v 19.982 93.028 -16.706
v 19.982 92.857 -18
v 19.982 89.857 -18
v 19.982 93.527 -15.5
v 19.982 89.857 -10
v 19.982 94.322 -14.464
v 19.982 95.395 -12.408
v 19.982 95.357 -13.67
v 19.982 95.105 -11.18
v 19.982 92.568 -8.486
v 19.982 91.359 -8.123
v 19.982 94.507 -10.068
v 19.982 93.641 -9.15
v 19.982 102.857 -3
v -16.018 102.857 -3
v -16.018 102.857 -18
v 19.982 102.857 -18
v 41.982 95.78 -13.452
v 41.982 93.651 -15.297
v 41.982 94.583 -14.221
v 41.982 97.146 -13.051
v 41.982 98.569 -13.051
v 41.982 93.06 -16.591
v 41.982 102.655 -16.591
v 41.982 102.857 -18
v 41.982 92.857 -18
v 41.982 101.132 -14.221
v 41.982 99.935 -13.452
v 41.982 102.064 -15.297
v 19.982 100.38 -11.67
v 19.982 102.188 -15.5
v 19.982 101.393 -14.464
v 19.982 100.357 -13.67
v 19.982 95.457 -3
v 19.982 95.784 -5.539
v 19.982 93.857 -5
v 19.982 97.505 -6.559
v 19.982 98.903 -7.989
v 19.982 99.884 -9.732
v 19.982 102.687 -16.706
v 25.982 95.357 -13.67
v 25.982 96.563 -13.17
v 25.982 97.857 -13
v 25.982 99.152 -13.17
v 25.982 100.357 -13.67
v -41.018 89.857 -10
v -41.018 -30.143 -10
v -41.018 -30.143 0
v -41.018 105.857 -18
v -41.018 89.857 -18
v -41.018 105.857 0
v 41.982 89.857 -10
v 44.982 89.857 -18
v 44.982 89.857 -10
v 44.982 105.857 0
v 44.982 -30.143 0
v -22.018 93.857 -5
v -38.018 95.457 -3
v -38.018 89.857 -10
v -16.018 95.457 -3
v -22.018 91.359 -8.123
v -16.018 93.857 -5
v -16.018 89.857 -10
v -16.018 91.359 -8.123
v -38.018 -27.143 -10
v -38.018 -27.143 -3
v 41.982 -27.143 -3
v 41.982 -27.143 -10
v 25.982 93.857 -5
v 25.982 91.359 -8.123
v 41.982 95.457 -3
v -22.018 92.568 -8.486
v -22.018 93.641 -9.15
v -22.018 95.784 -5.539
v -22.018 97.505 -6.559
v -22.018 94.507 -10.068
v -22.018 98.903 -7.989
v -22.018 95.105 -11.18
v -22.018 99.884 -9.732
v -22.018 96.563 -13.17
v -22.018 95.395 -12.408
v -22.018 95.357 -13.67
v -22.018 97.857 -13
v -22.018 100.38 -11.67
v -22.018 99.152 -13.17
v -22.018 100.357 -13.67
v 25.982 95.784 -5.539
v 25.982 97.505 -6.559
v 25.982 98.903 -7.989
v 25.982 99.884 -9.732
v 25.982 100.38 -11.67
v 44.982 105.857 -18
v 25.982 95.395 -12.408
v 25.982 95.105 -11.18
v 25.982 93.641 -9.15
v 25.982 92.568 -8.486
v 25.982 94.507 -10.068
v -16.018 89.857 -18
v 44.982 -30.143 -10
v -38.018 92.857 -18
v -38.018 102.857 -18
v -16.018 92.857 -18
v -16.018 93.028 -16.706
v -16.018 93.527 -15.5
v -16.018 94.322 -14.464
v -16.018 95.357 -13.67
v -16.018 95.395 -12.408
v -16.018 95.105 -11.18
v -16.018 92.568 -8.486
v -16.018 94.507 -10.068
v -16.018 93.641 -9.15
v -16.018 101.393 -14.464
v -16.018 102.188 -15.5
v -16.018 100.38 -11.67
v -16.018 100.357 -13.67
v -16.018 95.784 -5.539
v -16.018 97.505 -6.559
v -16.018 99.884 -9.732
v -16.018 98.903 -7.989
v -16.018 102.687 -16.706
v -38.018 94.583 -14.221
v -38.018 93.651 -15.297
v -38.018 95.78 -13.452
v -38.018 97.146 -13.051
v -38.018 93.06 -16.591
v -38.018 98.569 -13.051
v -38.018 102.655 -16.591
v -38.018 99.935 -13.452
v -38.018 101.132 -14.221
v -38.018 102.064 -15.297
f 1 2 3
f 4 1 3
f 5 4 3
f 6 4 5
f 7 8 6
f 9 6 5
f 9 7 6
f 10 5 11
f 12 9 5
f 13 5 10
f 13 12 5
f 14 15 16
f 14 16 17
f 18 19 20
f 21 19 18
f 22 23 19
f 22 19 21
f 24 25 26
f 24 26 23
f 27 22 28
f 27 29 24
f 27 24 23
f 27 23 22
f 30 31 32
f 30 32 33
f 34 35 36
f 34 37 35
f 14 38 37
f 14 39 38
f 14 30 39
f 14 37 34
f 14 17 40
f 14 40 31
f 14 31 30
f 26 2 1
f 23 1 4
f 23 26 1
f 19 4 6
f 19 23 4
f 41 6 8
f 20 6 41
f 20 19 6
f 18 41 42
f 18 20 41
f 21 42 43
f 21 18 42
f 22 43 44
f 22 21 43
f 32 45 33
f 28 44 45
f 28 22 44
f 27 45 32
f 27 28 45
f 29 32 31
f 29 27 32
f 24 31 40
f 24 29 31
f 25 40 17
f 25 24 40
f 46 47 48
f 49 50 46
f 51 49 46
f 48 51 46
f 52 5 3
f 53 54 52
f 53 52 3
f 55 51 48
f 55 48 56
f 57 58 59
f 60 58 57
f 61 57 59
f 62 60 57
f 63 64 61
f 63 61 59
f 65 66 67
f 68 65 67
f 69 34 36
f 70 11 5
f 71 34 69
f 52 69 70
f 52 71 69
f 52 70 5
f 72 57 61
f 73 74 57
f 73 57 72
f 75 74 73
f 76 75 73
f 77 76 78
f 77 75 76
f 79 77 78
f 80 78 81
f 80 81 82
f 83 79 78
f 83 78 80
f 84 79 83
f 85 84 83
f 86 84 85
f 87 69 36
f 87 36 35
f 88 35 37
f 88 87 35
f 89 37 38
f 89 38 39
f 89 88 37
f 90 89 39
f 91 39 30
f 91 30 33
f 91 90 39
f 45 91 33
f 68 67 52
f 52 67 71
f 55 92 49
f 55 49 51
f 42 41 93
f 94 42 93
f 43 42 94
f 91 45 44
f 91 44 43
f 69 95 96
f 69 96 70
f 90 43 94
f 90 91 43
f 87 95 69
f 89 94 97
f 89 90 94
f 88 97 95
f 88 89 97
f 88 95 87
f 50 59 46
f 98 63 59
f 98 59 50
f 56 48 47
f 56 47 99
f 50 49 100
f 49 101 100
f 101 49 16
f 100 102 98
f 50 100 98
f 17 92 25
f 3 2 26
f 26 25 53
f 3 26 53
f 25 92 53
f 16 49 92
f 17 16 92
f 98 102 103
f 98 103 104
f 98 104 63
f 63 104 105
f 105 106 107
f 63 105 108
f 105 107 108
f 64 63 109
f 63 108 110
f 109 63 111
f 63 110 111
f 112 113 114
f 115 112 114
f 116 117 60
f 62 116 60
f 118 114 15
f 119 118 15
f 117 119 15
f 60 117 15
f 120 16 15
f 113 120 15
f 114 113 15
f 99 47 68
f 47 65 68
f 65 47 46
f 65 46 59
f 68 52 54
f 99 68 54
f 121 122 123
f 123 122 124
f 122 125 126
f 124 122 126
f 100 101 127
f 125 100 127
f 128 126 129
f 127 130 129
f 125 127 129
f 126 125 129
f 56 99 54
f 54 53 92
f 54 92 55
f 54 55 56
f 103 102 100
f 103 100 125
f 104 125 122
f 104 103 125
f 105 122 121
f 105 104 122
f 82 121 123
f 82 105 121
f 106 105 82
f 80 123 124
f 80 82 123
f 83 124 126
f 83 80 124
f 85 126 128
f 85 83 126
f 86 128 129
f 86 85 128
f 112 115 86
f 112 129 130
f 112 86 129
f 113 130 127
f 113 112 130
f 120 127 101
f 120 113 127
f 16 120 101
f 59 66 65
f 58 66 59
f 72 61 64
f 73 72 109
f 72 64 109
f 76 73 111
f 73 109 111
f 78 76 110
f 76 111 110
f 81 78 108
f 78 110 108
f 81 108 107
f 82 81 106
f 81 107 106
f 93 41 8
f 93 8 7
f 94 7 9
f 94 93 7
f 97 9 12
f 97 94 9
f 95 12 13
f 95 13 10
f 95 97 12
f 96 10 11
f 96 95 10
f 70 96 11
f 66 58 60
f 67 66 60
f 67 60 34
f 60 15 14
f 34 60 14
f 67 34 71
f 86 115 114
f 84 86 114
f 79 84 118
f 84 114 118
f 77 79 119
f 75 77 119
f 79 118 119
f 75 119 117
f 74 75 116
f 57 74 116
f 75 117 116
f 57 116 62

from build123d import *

# Parameters (mm, degrees)
SASE_TABAN1_W               = 80
SASE_TABAN1_H               = 130
Y_KSEKLIK_EKSTR_ZYON4_DEPTH = 3
SASE_TABAN1_5_W             = 86
SASE_TABAN1_5_H             = 136
SASE_TABAN1_5_W_2           = 80
SASE_TABAN1_5_H_2           = 130
Y_KSEKLIK_EKSTR_ZYON5_DEPTH = 10
Y_KSEKLIK_EKSTR_ZYON6_REACH = 138.755
KES_EKSTR_ZYON1_START       = -13
EKLEM_ORTA_W                = 36
EKLEM_ORTA_H                = 15
KES_EKSTR_ZYON1_DEPTH       = 13
KES_EKSTR_ZYON3_DEPTH       = 42
KES_EKSTR_ZYON4_START       = -6
KES_EKSTR_ZYON4_DEPTH       = 6
Y_KSEKLIK_EKSTR_ZYON7_START = -3
Y_KSEKLIK_EKSTR_ZYON7_DEPTH = 3
Y_KSEKLIK_EKSTR_ZYON8_DEPTH = 3


with BuildPart() as part:
    # sase_taban1 → Yükseklik-Ekstrüzyon4 (new body)
    with BuildSketch(Plane.XY):
        with Locations((1.981566113, 37.857486255)):
            Rectangle(SASE_TABAN1_W, SASE_TABAN1_H)
    extrude(amount=-Y_KSEKLIK_EKSTR_ZYON4_DEPTH)

    # sase_taban1<5> → Yükseklik-Ekstrüzyon5 (add)
    with BuildSketch(Plane.XY):
        with Locations((1.981566113, 37.857486255)):
            Rectangle(SASE_TABAN1_5_W, SASE_TABAN1_5_H)
        with Locations((1.981566113, 37.857486255)):
            Rectangle(SASE_TABAN1_5_W_2, SASE_TABAN1_5_H_2, mode=Mode.SUBTRACT)
    extrude(amount=-Y_KSEKLIK_EKSTR_ZYON5_DEPTH)

    # Yükseklik-Ekstrüzyon6: up to this face of the body (flat: up to its plane)
    y_kseklik_ekstr_zyon6_end = Plane(part.part.faces().sort_by_distance((-41.018433887, 37.857486255, -5))[0])
    # sase_eklem1 → Yükseklik-Ekstrüzyon6 (add, up to the picked face)
    with BuildSketch(Plane(origin=(44.981566113, 0, 0), x_dir=(0, 0, -1), z_dir=(1, 0, 0)), mode=Mode.PRIVATE) as y_kseklik_ekstr_zyon6_sk1:
        with BuildLine():
            Line((18, 105.857486255), (0, 105.857486255))
            Line((0, 105.857486255), (0, 97.857486255))
            Line((0, 97.857486255), (10, 89.857486255))
            Line((10, 89.857486255), (18, 89.857486255))
            Line((18, 89.857486255), (18, 92.857486255))
            ThreePointArc((18, 92.857486255), (13, 97.857486255), (18, 102.857486255))
            Line((18, 102.857486255), (18, 105.857486255))
        make_face()
    y_kseklik_ekstr_zyon6_tool1 = split(extrude(y_kseklik_ekstr_zyon6_sk1.sketch, amount=-Y_KSEKLIK_EKSTR_ZYON6_REACH, mode=Mode.PRIVATE), bisect_by=y_kseklik_ekstr_zyon6_end, keep=Keep.BOTH, mode=Mode.PRIVATE)
    add(y_kseklik_ekstr_zyon6_tool1.solids().sort_by(Axis((44.981566, 98.87954, -8.791936), (-1, 0, 0)))[0])

    # eklem_orta → Kes-Ekstrüzyon1 (cut)
    with BuildSketch(Plane.XZ.offset(-89.857486255).offset(KES_EKSTR_ZYON1_START)):
        with Locations((1.981566113, -10.5)):
            Rectangle(EKLEM_ORTA_W, EKLEM_ORTA_H)
    extrude(amount=KES_EKSTR_ZYON1_DEPTH, mode=Mode.SUBTRACT)

    # eklem_kablo → Kes-Ekstrüzyon3 (cut)
    with BuildSketch(Plane.ZY.offset(-19.981566113)):
        with BuildLine():
            Line((-5, 93.857486255), (-8.123475238, 91.358706065))
            ThreePointArc((-8.123475238, 91.358706065), (-10.068499616, 94.506792744), (-13.669872981, 95.357486255))
            ThreePointArc((-13.669872981, 95.357486255), (-13, 97.857486255), (-13.669872981, 100.357486255))
            ThreePointArc((-13.669872981, 100.357486255), (-7.988742413, 98.903075741), (-5, 93.857486255))
        make_face()
    extrude(amount=KES_EKSTR_ZYON3_DEPTH, mode=Mode.SUBTRACT)

    # eklem_kablo<2> → Kes-Ekstrüzyon4 (cut)
    with BuildSketch(Plane.ZY.offset(-19.981566113).offset(KES_EKSTR_ZYON4_START)):
        with BuildLine():
            Line((-8.123475238, 91.358706065), (-5, 93.857486255))
            ThreePointArc((-5, 93.857486255), (-7.988742413, 98.903075741), (-13.669872981, 100.357486255))
            ThreePointArc((-13.669872981, 100.357486255), (-13, 97.857486255), (-13.669872981, 95.357486255))
            ThreePointArc((-13.669872981, 95.357486255), (-10.068499616, 94.506792744), (-8.123475238, 91.358706065))
        make_face()
    extrude(amount=KES_EKSTR_ZYON4_DEPTH, mode=Mode.SUBTRACT)

    # eklem_sag_kapak → Yükseklik-Ekstrüzyon7 (add)
    with BuildSketch(Plane.ZY.offset(41.018433887).offset(Y_KSEKLIK_EKSTR_ZYON7_START)):
        with BuildLine():
            Line((-18, 102.857486255), (-18, 92.857486255))
            ThreePointArc((-18, 92.857486255), (-13, 97.857486255), (-18, 102.857486255))
        make_face()
    extrude(amount=Y_KSEKLIK_EKSTR_ZYON7_DEPTH)

    # eklem_sol_kapak → Yükseklik-Ekstrüzyon8 (add)
    with BuildSketch(Plane(origin=(44.981566113, 0, 0), x_dir=(0, 0, -1), z_dir=(1, 0, 0))):
        with BuildLine():
            Line((18, 102.857486255), (18, 92.857486255))
            ThreePointArc((18, 92.857486255), (13, 97.857486255), (18, 102.857486255))
        make_face()
    extrude(amount=-Y_KSEKLIK_EKSTR_ZYON8_DEPTH)


solid = part.part
